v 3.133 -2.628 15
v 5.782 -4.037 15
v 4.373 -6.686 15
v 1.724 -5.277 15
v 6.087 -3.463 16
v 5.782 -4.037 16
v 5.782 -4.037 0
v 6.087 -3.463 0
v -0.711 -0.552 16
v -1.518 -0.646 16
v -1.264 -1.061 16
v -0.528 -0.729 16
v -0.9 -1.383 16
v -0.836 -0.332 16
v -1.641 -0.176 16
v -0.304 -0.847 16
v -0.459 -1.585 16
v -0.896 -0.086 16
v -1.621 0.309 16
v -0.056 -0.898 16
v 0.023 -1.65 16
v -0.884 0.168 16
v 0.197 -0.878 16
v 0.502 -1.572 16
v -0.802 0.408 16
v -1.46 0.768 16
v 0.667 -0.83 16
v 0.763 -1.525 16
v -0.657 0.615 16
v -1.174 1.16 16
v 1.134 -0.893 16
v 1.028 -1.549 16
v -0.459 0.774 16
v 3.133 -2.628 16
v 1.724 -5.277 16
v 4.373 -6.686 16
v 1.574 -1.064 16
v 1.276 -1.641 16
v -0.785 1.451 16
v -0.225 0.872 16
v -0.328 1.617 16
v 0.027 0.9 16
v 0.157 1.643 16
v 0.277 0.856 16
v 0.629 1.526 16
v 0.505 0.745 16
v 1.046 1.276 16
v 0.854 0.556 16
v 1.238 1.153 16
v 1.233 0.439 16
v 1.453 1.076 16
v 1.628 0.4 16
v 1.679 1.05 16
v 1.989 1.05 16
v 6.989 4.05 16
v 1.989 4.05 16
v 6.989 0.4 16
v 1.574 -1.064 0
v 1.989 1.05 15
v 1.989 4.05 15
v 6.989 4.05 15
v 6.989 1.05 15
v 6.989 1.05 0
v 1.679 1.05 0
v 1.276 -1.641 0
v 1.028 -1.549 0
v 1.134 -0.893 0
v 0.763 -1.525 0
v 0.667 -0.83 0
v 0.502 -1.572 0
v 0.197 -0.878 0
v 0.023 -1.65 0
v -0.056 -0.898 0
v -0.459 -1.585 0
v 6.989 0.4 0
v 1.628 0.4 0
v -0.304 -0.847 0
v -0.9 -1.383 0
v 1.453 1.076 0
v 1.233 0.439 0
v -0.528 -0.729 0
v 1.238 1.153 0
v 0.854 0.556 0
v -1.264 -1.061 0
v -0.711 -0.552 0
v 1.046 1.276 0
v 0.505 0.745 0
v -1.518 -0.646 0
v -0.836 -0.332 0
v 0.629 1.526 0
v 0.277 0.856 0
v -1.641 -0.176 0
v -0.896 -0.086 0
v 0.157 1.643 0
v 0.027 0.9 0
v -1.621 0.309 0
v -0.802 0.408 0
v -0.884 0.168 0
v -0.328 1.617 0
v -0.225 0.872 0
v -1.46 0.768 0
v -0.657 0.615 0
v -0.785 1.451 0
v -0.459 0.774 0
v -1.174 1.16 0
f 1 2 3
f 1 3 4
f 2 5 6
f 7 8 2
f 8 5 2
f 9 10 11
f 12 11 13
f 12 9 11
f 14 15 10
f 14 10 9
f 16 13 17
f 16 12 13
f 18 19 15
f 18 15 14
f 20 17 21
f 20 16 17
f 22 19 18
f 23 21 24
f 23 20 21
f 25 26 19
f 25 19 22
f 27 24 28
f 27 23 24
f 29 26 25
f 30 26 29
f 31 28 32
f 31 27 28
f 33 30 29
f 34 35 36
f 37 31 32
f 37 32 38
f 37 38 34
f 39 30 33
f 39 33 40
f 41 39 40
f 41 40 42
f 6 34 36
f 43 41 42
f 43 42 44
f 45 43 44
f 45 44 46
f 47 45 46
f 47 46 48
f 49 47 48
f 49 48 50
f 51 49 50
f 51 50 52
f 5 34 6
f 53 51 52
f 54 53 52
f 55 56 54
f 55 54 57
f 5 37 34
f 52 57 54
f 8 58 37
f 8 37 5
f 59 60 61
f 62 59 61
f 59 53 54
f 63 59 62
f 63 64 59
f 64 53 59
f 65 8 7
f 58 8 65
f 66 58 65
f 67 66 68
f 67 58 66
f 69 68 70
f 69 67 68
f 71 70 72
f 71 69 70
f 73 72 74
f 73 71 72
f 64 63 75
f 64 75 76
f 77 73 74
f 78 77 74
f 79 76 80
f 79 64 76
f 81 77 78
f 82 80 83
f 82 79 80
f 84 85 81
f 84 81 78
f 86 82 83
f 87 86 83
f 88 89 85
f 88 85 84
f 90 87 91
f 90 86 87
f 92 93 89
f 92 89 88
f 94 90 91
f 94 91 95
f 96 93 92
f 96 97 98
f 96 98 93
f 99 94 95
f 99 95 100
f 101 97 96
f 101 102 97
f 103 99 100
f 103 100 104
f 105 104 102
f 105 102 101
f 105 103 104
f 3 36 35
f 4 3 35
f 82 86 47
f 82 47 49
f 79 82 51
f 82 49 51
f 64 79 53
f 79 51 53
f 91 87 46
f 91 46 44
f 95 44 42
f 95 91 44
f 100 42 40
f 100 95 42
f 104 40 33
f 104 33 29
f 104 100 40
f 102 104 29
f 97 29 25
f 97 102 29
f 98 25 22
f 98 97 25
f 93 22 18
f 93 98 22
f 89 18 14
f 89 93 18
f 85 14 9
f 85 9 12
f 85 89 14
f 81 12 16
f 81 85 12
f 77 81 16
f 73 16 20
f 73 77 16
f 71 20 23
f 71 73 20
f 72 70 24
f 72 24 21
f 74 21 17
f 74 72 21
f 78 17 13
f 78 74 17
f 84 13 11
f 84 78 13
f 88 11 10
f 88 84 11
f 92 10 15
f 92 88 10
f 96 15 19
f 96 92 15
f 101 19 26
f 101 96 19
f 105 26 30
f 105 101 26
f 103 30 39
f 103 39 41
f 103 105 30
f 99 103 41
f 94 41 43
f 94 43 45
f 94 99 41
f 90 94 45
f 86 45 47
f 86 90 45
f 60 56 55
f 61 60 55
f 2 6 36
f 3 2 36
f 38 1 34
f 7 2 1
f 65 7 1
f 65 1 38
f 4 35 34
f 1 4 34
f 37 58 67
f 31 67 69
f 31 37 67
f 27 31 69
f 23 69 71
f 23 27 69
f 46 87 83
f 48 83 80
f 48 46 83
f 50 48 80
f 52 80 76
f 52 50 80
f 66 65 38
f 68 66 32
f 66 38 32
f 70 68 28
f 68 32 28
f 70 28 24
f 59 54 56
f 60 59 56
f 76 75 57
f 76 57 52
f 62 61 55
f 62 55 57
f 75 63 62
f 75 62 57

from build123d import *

# Parameters (mm, degrees)
BOSS_EXTRUDE2_DEPTH = 16
FILLET3_R           = 1
FILLET6_R           = 2
SKETCH7_W           = 5
SKETCH7_H           = 3
BOSS_EXTRUDE6_DEPTH = 1


with BuildPart() as part:
    # Sketch5 → Boss-Extrude2 (new body)
    with BuildSketch(Plane(origin=(4.228476288, 0, 0), x_dir=(1, 0, 0), z_dir=(0, 0, 1))):
        with BuildLine():
            Line((2.760085796, 0.4), (-3.422250513, 0.4))
            ThreePointArc((-3.422250513, 0.4), (-5.121328449, 0.113203437), (-3.547587232, -0.588549143))
            Line((-3.547587232, -0.588549143), (1.85826255, -3.462890458))
            Line((1.85826255, -3.462890458), (1.553106034, -4.036806393))
            Line((1.553106034, -4.036806393), (-3.378850655, -1.414438505))
            ThreePointArc((-3.378850655, -1.414438505), (-5.854676969, 0.279233492), (-2.955684082, 1.05))
            Line((-2.955684082, 1.05), (2.760085796, 1.05))
            Line((2.760085796, 1.05), (2.760085796, 0.4))
        make_face()
    extrude(amount=BOSS_EXTRUDE2_DEPTH)

    # Fillet3
    fillet3_edges = [part.edges().sort_by_distance(p)[0] for p in [
        (0.849625632, -1.414438505, 8),
        (1.272792206, 1.05, 8),
    ]]
    fillet(fillet3_edges, radius=FILLET3_R)

    # Fillet6
    fillet6_edges = [part.edges().sort_by_distance(p)[0] for p in [
        (0.680889056, -0.588549143, 8),
        (0.806225775, 0.4, 8),
    ]]
    fillet(fillet6_edges, radius=FILLET6_R)

    # Sketch7 → Boss-Extrude6 (add)
    with BuildSketch(Plane.XY.offset(16)):
        with Locations((4.488562084, 2.55)):
            Rectangle(SKETCH7_W, SKETCH7_H)
        Polygon((5.781582322, -4.036806393), (4.373167633, -6.685649172), (1.724324855, -5.277234484), (3.132739543, -2.628391705), align=None)
    extrude(amount=-BOSS_EXTRUDE6_DEPTH)


solid = part.part
